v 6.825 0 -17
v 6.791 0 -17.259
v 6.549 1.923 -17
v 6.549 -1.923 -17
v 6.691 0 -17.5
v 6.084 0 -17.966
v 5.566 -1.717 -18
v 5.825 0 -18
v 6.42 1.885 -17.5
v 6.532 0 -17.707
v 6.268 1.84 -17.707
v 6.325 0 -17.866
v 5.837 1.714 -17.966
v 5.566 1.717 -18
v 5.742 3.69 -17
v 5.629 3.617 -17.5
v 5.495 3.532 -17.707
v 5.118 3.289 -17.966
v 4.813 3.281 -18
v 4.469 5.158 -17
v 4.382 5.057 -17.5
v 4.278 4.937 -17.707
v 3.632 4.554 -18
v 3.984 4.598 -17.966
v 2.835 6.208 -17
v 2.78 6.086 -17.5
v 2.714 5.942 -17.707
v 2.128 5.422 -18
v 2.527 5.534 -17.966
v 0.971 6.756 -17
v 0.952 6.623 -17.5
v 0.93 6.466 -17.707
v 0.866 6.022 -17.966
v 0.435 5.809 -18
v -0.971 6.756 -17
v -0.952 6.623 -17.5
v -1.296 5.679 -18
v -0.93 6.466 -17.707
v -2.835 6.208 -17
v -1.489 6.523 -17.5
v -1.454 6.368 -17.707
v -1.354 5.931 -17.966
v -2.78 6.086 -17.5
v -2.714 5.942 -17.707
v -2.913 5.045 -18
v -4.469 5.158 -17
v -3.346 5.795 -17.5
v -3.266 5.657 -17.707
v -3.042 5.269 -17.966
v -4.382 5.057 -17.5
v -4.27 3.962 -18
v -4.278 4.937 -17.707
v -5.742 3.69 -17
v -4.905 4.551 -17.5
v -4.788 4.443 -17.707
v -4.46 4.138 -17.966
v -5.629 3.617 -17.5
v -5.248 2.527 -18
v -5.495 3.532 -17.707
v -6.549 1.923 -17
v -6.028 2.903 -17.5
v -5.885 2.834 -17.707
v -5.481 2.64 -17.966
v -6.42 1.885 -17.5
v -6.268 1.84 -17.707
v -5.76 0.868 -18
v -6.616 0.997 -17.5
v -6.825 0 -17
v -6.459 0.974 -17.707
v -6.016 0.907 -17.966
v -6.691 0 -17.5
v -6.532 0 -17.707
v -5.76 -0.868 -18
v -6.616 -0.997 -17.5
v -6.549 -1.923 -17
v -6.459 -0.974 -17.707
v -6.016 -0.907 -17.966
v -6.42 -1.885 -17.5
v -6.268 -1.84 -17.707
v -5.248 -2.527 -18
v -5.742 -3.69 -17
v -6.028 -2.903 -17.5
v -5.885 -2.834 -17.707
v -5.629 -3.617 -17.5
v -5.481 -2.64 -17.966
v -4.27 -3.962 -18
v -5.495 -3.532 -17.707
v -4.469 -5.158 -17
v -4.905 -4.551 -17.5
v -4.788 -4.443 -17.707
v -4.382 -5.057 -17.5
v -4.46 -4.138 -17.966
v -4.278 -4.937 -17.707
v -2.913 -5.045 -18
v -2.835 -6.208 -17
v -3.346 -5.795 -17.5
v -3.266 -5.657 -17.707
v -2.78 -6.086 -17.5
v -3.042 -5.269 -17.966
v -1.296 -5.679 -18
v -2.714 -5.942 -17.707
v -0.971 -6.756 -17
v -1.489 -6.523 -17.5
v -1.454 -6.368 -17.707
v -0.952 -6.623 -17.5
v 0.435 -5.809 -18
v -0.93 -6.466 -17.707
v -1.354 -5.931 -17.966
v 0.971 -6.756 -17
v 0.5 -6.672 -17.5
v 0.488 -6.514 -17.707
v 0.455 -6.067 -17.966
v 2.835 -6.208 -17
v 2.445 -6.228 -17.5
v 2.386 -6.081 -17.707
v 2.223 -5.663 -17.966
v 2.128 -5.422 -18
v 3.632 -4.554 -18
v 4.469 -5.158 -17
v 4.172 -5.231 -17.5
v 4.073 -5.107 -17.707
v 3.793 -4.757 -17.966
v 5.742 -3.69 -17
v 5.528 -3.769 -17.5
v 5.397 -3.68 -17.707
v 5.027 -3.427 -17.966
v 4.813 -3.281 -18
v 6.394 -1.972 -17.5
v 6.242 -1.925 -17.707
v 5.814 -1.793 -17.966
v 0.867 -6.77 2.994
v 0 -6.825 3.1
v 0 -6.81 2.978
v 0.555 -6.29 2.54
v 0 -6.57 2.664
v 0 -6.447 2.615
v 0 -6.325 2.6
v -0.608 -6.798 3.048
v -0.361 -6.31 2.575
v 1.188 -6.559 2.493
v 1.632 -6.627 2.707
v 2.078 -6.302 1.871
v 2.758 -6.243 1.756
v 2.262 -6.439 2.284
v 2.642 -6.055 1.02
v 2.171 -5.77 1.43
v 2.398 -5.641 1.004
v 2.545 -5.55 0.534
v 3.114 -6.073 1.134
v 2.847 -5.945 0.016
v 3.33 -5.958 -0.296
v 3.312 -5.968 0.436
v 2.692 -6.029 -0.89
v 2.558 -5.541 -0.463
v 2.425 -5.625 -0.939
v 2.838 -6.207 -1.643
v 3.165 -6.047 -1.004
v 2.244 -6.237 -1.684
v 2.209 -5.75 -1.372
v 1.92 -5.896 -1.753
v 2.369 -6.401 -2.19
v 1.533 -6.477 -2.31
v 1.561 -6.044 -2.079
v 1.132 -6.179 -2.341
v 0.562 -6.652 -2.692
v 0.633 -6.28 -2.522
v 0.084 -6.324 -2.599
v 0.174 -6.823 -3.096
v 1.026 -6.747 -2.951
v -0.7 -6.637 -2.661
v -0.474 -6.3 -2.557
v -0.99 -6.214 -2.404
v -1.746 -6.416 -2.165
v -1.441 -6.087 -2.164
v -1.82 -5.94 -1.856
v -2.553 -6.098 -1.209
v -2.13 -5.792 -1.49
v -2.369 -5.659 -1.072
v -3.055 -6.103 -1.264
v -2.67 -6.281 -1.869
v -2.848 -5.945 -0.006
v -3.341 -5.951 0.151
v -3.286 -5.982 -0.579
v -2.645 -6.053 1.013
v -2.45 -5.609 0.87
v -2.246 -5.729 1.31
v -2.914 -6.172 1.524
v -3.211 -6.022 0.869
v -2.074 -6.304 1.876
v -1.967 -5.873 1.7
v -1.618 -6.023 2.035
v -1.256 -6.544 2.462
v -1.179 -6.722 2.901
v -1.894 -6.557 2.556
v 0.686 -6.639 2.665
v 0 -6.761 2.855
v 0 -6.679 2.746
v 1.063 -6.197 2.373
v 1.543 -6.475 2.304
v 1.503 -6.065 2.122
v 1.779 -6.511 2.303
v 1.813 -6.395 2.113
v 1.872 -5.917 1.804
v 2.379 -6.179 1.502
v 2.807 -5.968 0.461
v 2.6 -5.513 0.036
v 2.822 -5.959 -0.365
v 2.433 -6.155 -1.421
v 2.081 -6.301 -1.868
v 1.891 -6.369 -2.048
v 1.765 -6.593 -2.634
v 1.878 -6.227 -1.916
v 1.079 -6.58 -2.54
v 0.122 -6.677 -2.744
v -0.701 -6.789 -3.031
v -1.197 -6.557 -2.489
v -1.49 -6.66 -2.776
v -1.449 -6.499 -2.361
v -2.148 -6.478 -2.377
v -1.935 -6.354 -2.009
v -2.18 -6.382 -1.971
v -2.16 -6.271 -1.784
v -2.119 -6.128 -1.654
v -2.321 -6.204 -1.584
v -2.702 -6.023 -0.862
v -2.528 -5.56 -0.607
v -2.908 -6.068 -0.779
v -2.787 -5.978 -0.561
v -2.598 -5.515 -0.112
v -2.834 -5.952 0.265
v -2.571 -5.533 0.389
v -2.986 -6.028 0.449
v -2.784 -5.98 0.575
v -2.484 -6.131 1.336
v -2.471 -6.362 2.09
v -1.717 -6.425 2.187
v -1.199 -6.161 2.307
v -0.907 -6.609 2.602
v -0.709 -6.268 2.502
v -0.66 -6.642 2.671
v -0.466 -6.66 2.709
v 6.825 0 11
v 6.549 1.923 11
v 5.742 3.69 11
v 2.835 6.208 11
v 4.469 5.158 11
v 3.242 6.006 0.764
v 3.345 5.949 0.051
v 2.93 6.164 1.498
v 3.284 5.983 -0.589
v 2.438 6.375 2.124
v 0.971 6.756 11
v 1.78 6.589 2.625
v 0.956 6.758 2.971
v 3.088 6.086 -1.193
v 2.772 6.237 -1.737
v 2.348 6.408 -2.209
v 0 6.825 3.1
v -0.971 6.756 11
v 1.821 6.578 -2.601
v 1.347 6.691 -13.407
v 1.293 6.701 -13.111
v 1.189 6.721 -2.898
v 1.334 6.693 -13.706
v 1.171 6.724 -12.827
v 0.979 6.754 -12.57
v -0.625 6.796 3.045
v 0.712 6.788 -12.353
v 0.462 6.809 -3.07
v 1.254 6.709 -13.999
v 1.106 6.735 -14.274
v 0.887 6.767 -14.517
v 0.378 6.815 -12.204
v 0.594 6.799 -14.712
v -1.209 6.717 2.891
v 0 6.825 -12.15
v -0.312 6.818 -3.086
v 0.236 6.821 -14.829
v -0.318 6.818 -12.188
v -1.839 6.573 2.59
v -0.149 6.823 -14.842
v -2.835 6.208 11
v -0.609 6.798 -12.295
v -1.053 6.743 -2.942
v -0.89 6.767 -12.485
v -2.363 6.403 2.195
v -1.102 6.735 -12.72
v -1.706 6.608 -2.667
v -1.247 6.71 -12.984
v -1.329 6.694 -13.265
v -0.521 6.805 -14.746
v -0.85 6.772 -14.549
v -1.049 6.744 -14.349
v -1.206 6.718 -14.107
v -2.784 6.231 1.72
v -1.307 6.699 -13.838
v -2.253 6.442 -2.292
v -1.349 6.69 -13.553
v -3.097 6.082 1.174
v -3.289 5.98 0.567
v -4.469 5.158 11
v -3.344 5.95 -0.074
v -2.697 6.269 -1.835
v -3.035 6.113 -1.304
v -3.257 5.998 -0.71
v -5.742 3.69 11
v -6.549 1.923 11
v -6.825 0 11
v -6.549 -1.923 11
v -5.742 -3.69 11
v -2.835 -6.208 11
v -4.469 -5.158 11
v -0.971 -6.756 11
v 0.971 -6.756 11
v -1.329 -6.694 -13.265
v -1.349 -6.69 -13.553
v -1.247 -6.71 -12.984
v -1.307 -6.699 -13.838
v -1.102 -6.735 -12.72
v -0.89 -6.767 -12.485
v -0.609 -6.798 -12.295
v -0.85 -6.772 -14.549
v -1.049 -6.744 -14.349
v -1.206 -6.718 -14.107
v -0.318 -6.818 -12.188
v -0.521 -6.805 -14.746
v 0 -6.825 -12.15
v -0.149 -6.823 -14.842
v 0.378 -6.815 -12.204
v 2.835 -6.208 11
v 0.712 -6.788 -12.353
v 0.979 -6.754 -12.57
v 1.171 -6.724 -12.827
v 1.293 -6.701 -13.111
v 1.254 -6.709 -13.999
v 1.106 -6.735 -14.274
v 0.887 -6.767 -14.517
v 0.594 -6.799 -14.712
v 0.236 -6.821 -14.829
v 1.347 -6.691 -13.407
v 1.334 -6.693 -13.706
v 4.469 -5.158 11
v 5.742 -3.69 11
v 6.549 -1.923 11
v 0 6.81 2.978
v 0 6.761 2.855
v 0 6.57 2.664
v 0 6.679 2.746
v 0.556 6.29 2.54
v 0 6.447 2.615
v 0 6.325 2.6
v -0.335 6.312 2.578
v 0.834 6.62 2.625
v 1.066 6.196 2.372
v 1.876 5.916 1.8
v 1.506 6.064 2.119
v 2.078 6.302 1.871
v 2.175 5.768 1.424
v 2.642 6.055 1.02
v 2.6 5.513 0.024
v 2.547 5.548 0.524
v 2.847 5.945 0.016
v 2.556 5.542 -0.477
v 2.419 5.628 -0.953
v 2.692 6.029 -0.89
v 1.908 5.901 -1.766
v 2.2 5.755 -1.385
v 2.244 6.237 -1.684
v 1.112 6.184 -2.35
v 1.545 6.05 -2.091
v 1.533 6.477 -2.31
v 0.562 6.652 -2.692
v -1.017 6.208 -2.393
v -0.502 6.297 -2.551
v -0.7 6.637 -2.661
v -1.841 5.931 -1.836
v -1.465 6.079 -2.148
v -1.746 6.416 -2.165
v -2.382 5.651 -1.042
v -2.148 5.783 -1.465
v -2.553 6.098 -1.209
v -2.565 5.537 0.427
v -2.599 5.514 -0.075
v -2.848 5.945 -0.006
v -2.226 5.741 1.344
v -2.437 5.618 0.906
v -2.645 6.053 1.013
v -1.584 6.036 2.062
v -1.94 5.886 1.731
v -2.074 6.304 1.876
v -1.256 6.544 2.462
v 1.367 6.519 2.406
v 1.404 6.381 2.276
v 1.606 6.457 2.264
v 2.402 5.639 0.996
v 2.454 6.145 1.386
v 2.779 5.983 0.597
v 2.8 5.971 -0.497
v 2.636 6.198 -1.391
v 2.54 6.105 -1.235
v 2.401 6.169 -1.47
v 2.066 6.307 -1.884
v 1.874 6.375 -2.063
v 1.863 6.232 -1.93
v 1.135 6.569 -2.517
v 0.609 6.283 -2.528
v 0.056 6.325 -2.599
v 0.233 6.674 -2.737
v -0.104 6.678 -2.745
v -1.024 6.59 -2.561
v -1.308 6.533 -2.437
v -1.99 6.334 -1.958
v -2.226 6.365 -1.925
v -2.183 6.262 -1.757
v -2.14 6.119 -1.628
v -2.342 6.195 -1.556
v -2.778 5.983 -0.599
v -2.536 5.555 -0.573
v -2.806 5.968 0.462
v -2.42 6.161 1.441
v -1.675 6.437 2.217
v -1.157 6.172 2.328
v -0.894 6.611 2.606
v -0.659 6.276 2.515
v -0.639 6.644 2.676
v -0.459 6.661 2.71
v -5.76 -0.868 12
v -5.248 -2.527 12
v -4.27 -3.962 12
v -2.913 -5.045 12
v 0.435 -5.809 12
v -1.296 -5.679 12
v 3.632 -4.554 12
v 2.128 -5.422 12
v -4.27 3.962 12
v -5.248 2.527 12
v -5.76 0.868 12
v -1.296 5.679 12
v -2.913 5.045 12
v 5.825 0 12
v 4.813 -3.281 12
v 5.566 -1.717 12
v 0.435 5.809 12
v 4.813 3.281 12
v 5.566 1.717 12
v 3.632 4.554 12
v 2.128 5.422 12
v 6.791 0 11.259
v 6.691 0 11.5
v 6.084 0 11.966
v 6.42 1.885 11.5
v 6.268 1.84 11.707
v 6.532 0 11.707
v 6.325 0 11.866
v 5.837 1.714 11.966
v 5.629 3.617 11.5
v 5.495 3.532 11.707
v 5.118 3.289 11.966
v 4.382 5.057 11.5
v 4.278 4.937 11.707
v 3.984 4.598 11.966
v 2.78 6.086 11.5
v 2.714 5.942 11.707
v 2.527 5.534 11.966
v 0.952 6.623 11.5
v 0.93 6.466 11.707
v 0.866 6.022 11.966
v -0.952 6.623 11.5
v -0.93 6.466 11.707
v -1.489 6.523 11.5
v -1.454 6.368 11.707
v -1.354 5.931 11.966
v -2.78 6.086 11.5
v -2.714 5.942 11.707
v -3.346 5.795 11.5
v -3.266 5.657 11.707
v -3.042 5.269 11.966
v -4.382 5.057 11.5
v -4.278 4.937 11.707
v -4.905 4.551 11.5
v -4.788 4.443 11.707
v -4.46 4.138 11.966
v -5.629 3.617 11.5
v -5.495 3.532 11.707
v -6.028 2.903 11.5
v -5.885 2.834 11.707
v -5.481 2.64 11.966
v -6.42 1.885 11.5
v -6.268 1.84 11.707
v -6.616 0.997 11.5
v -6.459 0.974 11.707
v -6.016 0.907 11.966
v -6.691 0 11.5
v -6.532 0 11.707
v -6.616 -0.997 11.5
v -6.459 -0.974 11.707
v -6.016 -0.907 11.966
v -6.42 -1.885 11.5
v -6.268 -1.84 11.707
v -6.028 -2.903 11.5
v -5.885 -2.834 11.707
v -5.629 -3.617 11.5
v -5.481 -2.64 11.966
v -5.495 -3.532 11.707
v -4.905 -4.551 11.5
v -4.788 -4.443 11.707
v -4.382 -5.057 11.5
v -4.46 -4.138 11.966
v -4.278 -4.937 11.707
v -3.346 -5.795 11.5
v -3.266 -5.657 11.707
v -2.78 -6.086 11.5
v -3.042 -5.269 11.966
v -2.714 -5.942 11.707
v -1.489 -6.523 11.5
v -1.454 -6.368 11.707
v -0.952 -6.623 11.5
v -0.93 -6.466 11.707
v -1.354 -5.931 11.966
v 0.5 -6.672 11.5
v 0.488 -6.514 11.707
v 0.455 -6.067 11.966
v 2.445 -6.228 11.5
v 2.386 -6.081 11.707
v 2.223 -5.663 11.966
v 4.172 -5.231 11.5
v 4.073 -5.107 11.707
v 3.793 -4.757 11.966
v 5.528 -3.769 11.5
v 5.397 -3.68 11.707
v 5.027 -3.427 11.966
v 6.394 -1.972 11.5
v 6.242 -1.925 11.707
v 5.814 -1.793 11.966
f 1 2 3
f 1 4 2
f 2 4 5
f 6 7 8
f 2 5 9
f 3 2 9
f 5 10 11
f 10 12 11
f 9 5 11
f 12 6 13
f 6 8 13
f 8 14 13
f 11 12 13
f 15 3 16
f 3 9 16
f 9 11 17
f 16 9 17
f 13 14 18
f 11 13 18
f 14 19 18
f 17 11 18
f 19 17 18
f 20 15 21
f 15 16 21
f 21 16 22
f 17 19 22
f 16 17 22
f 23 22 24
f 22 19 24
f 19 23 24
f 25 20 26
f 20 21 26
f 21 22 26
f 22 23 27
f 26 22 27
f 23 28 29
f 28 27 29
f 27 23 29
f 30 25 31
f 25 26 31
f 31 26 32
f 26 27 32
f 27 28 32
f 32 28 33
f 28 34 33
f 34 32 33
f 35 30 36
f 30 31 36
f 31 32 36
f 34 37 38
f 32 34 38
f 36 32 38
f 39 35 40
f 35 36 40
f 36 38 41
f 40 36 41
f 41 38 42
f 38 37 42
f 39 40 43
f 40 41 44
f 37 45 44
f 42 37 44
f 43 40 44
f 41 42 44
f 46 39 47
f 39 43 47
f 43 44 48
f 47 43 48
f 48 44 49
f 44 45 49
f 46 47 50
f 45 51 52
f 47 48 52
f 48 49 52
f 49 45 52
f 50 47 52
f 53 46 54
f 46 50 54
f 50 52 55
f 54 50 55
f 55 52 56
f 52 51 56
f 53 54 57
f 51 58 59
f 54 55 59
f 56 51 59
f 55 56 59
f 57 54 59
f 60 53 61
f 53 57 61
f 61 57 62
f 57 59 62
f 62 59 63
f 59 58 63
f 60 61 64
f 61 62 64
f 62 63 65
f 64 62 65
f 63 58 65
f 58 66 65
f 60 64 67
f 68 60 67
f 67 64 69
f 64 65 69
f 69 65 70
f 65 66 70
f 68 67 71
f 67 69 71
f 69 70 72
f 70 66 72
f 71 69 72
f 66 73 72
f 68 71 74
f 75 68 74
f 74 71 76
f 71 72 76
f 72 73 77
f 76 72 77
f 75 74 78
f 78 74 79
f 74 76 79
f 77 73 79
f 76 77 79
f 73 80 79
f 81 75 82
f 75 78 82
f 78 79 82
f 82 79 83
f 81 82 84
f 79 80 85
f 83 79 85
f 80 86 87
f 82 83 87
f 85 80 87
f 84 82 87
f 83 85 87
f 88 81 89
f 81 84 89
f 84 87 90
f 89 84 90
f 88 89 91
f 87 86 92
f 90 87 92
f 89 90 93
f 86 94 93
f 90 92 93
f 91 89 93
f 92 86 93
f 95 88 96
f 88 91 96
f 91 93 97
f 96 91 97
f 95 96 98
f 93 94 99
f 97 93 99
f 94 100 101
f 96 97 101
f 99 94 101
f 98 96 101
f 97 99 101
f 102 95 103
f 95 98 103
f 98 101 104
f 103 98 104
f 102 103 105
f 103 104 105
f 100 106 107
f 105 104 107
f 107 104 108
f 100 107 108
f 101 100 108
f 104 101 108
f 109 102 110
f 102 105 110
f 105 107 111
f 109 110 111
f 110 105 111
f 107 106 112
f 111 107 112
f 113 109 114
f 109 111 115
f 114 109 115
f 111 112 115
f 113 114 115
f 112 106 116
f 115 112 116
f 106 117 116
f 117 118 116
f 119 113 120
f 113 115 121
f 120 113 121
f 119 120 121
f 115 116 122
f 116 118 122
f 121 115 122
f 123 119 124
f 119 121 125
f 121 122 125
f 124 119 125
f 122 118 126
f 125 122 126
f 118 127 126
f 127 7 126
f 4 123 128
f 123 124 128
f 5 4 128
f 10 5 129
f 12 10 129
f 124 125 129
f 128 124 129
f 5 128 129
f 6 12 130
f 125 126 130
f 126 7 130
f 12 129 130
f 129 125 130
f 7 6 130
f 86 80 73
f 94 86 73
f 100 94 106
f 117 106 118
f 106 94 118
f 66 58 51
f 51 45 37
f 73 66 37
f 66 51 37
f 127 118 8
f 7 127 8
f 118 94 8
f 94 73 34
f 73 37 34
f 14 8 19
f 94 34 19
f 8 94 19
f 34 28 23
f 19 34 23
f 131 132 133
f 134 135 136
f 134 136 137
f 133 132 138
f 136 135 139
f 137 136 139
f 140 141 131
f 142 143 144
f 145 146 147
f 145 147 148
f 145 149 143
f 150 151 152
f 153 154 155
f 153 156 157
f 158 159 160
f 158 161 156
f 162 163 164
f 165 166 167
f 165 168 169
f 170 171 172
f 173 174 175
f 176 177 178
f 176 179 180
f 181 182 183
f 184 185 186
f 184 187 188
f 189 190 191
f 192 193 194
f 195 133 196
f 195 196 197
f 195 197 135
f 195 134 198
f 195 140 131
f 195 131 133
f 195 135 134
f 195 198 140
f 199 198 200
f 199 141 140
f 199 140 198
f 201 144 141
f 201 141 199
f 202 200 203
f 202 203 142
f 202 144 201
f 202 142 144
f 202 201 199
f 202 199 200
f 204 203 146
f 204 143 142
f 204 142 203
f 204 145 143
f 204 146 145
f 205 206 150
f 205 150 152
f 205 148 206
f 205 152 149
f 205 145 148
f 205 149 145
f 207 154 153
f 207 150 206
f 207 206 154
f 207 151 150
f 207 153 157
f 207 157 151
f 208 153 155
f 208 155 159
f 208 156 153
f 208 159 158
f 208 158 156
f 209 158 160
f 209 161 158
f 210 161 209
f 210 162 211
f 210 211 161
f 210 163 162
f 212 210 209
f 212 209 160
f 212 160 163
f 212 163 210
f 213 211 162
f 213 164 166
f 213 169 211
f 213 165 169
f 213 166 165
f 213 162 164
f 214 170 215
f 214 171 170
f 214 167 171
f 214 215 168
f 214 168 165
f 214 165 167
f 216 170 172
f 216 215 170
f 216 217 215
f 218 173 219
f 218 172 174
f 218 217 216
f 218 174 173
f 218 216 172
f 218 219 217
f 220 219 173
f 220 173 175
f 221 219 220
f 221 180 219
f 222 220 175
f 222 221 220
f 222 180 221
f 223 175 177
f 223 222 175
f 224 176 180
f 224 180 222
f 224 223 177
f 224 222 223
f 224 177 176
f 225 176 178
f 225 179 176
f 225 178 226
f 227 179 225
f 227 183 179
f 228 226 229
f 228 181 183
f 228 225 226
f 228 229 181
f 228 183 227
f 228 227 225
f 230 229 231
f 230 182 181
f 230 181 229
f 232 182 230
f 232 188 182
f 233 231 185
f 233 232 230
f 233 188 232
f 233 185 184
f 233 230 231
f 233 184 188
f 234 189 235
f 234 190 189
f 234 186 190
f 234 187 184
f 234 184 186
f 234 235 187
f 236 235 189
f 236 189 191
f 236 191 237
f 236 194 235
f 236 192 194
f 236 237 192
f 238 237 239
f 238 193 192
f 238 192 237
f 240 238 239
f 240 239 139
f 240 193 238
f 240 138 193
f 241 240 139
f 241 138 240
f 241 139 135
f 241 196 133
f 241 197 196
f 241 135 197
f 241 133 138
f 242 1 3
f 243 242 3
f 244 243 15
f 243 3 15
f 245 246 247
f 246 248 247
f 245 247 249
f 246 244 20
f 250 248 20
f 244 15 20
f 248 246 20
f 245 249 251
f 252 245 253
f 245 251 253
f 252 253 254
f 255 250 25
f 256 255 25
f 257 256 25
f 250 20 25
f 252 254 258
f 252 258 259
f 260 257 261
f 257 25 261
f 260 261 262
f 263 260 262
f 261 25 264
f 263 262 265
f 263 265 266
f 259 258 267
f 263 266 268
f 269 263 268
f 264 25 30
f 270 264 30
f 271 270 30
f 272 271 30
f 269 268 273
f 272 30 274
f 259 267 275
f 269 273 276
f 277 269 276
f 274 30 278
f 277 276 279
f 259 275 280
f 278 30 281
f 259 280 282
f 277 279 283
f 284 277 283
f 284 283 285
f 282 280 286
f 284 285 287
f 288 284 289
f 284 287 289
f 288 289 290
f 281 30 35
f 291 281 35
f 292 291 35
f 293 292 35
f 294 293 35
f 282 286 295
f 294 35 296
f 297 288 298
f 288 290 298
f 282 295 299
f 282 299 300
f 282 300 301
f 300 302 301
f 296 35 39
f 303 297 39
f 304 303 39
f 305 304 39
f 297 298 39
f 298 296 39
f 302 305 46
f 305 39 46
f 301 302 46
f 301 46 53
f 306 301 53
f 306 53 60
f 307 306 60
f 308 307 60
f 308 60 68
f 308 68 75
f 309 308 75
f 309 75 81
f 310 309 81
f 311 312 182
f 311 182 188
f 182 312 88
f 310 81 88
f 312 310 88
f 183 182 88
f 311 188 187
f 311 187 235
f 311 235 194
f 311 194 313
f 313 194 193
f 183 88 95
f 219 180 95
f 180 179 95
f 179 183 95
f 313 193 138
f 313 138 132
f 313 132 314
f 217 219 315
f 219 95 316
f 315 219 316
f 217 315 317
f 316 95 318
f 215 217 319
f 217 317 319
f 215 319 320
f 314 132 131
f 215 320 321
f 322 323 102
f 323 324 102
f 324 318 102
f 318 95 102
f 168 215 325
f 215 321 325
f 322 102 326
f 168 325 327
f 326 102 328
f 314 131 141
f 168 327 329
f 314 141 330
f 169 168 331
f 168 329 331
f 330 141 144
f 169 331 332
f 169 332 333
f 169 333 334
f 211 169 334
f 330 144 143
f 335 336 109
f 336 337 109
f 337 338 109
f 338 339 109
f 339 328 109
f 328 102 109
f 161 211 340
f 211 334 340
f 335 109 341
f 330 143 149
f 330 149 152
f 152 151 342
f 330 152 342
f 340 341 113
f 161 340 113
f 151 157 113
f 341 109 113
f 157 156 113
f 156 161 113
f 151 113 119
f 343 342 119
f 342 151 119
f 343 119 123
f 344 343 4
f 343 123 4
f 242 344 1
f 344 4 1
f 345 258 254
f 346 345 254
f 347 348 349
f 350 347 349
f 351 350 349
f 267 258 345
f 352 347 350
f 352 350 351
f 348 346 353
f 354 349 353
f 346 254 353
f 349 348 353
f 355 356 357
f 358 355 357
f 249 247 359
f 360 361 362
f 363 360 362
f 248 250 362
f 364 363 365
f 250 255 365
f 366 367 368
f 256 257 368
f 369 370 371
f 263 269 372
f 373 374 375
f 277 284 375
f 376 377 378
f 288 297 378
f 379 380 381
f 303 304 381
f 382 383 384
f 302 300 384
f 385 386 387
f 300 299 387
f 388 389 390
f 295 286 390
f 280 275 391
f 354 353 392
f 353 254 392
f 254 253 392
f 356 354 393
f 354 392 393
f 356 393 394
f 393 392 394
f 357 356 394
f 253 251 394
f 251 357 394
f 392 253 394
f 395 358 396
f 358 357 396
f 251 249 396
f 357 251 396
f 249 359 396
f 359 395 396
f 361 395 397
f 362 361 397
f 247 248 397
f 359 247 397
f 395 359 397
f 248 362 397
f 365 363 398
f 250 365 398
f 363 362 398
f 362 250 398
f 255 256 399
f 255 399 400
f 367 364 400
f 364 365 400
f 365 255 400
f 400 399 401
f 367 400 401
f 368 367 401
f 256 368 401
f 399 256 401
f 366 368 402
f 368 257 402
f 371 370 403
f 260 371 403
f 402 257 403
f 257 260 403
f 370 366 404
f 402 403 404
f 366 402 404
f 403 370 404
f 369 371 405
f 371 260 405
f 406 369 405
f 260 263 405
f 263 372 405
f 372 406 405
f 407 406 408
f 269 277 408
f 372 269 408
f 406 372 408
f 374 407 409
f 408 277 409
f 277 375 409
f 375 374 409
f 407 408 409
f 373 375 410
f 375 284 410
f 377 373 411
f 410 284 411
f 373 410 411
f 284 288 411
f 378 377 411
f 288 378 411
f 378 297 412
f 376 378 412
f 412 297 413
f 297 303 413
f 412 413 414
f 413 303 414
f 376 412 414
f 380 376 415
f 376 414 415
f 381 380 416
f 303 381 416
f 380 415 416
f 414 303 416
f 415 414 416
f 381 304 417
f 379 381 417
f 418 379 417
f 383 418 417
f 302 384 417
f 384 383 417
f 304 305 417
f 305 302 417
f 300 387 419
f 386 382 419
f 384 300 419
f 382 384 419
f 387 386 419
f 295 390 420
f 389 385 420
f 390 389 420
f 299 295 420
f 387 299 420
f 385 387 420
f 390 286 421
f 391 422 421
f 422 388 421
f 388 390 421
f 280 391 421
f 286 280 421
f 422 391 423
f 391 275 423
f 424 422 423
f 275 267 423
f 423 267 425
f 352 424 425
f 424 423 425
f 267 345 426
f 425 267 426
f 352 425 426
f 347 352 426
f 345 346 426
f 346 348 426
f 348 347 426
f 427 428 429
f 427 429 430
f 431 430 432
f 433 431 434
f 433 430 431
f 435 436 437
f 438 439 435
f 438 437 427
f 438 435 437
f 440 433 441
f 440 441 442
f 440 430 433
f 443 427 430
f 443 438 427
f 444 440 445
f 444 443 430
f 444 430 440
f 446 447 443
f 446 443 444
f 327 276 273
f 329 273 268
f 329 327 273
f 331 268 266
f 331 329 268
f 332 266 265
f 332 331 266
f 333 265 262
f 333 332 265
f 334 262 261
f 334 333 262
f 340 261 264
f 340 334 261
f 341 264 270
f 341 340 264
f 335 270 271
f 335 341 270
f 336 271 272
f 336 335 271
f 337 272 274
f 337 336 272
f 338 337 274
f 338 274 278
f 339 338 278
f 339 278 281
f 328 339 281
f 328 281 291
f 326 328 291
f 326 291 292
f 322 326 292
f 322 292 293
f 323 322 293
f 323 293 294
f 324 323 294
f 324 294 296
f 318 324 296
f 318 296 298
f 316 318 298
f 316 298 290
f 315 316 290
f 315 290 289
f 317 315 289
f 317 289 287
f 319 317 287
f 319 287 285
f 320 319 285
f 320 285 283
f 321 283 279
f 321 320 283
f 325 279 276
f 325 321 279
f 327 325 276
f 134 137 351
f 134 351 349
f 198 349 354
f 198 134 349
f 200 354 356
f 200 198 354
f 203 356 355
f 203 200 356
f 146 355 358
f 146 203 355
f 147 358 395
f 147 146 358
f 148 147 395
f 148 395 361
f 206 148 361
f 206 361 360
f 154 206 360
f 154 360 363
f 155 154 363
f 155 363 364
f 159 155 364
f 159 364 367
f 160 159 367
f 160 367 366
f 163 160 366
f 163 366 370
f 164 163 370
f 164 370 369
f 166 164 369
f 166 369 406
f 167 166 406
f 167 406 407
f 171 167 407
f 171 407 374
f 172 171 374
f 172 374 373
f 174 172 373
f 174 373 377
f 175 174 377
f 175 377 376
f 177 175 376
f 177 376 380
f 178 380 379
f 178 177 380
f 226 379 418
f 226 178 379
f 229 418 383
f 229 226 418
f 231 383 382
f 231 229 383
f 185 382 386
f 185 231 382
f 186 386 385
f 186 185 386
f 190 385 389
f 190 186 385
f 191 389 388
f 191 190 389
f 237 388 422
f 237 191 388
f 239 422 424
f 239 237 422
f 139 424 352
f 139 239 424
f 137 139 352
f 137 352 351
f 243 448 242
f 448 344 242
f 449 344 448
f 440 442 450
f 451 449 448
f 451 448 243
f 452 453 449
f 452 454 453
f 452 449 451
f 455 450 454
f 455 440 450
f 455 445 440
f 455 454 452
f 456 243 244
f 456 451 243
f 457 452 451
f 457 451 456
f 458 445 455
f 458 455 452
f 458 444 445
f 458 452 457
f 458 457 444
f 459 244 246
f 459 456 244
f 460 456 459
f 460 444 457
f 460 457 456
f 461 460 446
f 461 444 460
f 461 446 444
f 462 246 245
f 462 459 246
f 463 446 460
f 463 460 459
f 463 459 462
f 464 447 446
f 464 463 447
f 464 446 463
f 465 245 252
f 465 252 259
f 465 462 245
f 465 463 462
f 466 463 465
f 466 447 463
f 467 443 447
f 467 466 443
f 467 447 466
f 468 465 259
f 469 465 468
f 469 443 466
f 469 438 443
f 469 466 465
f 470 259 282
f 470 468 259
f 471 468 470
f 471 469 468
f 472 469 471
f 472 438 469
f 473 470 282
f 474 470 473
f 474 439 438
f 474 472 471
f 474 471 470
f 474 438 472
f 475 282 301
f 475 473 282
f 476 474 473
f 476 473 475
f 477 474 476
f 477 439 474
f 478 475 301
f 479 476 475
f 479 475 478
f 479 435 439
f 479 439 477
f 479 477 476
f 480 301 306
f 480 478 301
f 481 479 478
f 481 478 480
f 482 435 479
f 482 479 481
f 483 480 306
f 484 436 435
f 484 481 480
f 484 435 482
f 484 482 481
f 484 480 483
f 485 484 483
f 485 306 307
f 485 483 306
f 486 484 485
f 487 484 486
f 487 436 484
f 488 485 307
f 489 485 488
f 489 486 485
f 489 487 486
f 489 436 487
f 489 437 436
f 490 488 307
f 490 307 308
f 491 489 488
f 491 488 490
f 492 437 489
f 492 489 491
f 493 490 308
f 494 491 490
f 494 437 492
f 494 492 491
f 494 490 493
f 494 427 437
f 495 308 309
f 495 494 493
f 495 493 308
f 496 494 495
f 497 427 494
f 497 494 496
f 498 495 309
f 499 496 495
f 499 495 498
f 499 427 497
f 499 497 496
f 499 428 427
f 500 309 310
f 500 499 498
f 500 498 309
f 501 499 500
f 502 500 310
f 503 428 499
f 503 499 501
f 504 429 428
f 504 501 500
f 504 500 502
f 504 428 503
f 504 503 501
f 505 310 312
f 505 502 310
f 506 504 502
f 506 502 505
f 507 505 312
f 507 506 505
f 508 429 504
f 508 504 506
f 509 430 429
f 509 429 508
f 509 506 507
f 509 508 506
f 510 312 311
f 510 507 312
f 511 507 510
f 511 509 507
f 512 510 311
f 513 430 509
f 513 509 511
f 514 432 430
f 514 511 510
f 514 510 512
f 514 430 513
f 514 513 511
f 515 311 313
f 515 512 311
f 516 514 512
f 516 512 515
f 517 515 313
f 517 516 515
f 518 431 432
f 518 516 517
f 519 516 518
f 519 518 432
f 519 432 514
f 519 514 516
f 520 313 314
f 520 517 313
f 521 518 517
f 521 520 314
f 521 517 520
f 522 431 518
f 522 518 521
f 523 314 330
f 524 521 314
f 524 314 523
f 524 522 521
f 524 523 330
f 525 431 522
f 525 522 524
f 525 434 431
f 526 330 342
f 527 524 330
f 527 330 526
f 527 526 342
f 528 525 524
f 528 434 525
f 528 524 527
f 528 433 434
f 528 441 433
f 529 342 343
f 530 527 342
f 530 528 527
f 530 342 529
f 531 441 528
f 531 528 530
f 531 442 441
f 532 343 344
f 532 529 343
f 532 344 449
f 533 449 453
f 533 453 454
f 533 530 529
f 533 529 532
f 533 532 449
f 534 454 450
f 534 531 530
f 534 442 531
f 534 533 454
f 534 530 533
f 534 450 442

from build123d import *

# Parameters (mm, degrees)
BOSS_EXTRUDE1_DEPTH      = 12
BOSS_EXTRUDE1_DEPTH_BACK = 18
SKETCH1_R                = 6.825
CUT_EXTRUDE1_DEPTH       = 21.424525698
CUT_EXTRUDE1_DEPTH_BACK  = 21.424525698
SKETCH2_R                = 2.6
SKETCH2_R_2              = 1.35
FILLET1_R                = 1
FILLET2_R                = 0.5


with BuildPart() as part:
    # Sketch1 → Boss-Extrude1 (new, two sides: drawn at the far end of the back side and taken through both)
    with BuildSketch(Plane.XY.offset(-BOSS_EXTRUDE1_DEPTH_BACK)):
        Circle(SKETCH1_R)
    extrude(amount=BOSS_EXTRUDE1_DEPTH + BOSS_EXTRUDE1_DEPTH_BACK)

    # Sketch2 → Cut-Extrude1 (cut, two sides: drawn at the far end of the back side and taken through both)
    with BuildSketch(Plane(origin=(0, 0, 0), x_dir=(1, 0, 0), z_dir=(0, 1, 0)).offset(-CUT_EXTRUDE1_DEPTH_BACK)):
        with Locations(Location((0, 0, 0), (0, 0, 270))):
            Circle(SKETCH2_R)
        with Locations(Location((0, 13.5, 0), (0, 0, 270))):
            Circle(SKETCH2_R_2)
    extrude(amount=CUT_EXTRUDE1_DEPTH + CUT_EXTRUDE1_DEPTH_BACK, mode=Mode.SUBTRACT)

    # Fillet1
    fillet1_edges = [part.edges().sort_by_distance(p)[0] for p in [
        (-6.825, 0, 12),
        (-6.825, 0, -18),
    ]]
    fillet(fillet1_edges, radius=FILLET1_R)

    # Fillet2
    fillet2_edges = [part.edges().sort_by_distance(p)[0] for p in [
        (1e-09, 6.825, -2.600000001),
        (0, -6.825, -2.600000002),
    ]]
    fillet(fillet2_edges, radius=FILLET2_R)


solid = part.part
